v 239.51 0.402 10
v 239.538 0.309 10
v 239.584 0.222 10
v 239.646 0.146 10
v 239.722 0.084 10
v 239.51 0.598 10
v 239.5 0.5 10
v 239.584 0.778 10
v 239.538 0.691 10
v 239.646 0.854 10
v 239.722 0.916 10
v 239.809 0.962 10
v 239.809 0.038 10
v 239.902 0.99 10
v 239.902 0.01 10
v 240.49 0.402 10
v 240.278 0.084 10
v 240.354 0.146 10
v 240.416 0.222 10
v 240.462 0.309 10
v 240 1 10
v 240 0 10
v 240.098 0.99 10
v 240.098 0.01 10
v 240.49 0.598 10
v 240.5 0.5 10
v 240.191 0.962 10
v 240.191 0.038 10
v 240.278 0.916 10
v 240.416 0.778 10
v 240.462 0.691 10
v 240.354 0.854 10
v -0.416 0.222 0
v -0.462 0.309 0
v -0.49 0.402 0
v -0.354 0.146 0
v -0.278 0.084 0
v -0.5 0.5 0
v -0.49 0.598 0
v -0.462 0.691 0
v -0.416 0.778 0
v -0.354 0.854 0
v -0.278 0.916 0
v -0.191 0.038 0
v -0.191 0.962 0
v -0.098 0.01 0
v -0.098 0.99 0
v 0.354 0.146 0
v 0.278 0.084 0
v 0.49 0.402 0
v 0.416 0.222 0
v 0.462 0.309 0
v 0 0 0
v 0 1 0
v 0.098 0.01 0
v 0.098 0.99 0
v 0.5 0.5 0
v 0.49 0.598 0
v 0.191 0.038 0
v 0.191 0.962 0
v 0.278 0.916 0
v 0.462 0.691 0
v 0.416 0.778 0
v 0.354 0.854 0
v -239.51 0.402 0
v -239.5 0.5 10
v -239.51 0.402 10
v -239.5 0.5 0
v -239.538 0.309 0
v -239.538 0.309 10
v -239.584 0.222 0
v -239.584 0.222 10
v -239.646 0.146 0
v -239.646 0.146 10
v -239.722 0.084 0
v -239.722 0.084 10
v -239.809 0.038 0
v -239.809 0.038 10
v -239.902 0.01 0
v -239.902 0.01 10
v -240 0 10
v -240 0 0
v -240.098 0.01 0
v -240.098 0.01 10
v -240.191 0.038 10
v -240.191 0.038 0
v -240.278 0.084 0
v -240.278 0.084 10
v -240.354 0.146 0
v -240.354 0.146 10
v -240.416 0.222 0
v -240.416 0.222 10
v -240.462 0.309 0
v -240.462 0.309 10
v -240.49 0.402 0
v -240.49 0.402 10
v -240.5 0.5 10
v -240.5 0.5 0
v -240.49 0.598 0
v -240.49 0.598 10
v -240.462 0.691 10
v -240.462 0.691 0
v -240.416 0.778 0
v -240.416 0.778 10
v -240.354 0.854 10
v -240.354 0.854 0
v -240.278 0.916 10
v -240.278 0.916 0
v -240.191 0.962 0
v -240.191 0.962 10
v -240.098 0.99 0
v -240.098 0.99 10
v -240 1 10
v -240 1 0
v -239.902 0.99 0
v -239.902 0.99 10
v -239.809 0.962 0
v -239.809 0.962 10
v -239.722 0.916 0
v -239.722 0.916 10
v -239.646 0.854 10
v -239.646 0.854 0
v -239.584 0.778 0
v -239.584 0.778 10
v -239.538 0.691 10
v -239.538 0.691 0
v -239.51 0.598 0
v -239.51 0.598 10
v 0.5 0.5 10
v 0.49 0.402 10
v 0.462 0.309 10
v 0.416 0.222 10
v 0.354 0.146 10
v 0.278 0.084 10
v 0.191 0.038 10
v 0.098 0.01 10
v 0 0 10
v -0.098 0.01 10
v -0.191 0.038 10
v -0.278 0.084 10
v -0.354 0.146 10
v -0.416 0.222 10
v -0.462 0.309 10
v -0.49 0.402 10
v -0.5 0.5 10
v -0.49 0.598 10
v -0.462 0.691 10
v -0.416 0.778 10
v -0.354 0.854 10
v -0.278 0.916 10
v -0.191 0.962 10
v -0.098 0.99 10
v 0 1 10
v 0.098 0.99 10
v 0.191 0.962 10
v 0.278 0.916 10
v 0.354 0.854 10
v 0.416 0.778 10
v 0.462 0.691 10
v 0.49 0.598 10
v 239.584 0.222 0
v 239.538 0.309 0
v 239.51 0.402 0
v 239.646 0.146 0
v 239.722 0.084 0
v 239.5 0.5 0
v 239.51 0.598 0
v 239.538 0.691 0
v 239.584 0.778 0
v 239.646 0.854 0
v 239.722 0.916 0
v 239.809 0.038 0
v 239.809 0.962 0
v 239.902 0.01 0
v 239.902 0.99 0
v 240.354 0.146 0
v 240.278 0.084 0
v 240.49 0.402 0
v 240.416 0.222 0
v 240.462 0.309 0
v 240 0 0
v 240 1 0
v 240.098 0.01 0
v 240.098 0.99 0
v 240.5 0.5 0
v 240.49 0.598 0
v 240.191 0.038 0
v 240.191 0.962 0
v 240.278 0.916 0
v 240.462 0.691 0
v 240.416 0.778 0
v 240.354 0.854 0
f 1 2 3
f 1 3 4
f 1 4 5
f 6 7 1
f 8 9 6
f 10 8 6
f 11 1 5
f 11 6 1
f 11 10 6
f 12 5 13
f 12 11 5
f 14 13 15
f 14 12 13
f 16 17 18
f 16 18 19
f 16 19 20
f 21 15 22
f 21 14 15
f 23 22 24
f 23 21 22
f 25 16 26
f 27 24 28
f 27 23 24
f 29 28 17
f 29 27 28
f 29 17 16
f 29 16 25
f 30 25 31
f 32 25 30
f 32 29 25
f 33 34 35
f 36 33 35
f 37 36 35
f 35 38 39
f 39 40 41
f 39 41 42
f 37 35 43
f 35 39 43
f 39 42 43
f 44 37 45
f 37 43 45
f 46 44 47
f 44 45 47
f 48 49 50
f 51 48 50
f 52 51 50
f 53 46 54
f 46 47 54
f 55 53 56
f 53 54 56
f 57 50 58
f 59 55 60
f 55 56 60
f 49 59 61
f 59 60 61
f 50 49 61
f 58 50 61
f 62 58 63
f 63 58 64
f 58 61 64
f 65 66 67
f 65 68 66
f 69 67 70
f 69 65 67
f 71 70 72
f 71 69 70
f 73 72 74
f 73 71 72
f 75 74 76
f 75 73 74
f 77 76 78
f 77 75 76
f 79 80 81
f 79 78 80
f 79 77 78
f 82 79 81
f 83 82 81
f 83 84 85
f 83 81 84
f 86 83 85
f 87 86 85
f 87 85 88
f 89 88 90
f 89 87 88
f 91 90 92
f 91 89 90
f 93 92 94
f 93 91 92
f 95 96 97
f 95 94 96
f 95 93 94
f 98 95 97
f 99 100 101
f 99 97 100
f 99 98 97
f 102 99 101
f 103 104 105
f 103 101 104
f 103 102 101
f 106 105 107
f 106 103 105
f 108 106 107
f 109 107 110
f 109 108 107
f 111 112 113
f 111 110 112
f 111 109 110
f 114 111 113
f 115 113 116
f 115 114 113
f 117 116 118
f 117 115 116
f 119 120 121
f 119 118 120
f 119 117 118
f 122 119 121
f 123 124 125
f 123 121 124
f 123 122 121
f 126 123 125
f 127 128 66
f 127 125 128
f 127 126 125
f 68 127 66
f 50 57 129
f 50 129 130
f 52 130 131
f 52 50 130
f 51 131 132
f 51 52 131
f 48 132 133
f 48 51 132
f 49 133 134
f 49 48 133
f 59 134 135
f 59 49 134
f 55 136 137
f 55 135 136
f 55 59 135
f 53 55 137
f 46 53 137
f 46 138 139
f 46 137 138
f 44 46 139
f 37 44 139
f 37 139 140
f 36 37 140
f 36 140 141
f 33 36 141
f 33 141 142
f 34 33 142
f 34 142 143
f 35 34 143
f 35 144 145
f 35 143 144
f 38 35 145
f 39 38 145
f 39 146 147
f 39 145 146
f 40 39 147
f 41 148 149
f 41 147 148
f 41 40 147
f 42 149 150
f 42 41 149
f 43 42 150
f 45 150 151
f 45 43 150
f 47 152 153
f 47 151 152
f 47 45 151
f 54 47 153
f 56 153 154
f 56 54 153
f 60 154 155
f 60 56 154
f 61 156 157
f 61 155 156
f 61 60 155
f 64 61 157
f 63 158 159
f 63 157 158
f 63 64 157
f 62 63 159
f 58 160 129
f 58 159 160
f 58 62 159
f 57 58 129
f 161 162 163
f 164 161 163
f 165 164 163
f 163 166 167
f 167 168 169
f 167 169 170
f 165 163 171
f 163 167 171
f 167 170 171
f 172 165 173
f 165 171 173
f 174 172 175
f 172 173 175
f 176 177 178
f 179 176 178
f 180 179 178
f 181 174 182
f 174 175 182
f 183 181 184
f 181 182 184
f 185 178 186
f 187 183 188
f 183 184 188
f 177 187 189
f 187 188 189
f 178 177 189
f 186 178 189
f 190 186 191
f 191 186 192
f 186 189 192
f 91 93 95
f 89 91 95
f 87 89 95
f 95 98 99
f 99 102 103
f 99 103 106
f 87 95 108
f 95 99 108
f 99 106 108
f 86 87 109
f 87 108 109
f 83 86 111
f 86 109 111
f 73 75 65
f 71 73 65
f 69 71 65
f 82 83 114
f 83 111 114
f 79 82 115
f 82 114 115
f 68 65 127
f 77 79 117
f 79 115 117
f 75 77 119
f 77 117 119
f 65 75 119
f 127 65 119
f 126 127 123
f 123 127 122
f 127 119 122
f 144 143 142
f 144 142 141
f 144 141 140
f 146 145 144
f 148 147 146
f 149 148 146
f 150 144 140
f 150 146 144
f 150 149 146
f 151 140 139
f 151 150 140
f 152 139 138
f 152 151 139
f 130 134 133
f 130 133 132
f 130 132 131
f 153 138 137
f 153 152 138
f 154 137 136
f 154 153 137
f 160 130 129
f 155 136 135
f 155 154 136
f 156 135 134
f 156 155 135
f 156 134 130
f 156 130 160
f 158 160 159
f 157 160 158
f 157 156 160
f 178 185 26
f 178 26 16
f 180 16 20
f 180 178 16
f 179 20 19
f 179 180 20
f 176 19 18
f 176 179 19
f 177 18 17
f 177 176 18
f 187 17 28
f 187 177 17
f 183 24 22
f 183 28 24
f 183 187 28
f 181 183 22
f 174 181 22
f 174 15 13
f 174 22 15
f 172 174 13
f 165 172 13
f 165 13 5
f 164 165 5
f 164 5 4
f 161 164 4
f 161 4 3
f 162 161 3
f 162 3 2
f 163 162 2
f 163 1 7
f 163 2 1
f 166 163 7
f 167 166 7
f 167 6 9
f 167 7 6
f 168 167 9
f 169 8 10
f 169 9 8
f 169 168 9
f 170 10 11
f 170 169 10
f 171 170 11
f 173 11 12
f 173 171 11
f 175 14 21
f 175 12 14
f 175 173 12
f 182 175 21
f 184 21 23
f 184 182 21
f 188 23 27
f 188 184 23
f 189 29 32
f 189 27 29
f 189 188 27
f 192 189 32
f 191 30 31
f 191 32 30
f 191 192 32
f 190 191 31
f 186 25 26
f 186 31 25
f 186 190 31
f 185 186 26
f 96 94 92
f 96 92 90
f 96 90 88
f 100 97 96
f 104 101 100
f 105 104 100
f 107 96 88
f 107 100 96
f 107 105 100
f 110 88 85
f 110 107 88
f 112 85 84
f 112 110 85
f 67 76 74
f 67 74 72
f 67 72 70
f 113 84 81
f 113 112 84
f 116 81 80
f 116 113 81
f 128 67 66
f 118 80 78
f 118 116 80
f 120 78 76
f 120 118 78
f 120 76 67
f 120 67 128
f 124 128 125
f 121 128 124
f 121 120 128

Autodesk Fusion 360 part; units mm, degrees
sketch "ContactArea" plane through (0, 0, 0) normal (0, 0, 1) x (1, 0, 0)
  line L0 (300, -10) -> (-300, -10)
  line L1 (-300, -10) -> (-300, 10)
  line L2 (-300, 10) -> (300, 10)
  line L3 (300, 10) -> (300, -10)
  line L4 (300, -10) -> (-300, 10) construction
  line L5 (-300, -10) -> (300, 10) construction
  dimension "d3" = 600
  dimension "d4" = 20
sketch "Sketch2" plane through (0, 0, 0) normal (0, 0, 1) x (1, 0, 0)
  circle A0 centre (240, 0.5) radius 0.5
  line L0 (300, 10) -> (300, -10)
  line L1 (-300, 10) -> (300, 10)
  circle A1 centre (-240, 0.5) radius 0.5
  line L2 (-300, -10) -> (-300, 10)
  dimension "d5" = 1
  dimension "d11" = 60
  dimension "d12" = 9.5
  dimension "d13" = 1
  dimension "d14" = 60
  dimension "d15" = 9.5
extrude "Extrude1" add sketch "Sketch2" along normal blind 10 contours A0 makes body 1
pattern_linear "R-Pattern1" count 3 spacing 240 along (-1, 0, 0) of bodies 1 makes body 2 at (0.4994, 0.4751, 6.6667) makes body 3 at (-239.9378, 0.9961, 6.6667)
equation "ContactAreaLength = 600 mm"
equation "ContactAreaWidth = 20 mm"
equation "d3 = ContactAreaLength"
equation "d4 = ContactAreaWidth"
equation "Coord_Y = 9.5 mm"
equation "UserOffset1 = 60 mm"
equation "UserOffset2 = 60 mm"
equation "Offset1 = if(PlacingLength >= MinDistance; UserOffset1; ContactAreaLength / 2)"
equation "Offset2 = if(PlacingLength >= MinDistance; UserOffset2; Offset1)"
equation "d11 = Offset1"
equation "d12 = Coord_Y"
equation "d14 = Offset2"
equation "d15 = Coord_Y"
equation "PlacingLength = ContactAreaLength - UserOffset1 - UserOffset2"
equation "MinDistance = 32 mm"
equation "MaxDistance = 300 mm"
equation "NumberOfIntervals = ceil(PlacingLength / MaxDistance)"
equation "NumberOfComponents = if(PlacingLength >= MinDistance; NumberOfIntervals + 1; 1)"
equation "SpaceBetween = if(PlacingLength >= MinDistance; PlacingLength / NumberOfIntervals; 0 mm)"
equation "d25 = NumberOfComponents"
equation "d27 = SpaceBetween"
